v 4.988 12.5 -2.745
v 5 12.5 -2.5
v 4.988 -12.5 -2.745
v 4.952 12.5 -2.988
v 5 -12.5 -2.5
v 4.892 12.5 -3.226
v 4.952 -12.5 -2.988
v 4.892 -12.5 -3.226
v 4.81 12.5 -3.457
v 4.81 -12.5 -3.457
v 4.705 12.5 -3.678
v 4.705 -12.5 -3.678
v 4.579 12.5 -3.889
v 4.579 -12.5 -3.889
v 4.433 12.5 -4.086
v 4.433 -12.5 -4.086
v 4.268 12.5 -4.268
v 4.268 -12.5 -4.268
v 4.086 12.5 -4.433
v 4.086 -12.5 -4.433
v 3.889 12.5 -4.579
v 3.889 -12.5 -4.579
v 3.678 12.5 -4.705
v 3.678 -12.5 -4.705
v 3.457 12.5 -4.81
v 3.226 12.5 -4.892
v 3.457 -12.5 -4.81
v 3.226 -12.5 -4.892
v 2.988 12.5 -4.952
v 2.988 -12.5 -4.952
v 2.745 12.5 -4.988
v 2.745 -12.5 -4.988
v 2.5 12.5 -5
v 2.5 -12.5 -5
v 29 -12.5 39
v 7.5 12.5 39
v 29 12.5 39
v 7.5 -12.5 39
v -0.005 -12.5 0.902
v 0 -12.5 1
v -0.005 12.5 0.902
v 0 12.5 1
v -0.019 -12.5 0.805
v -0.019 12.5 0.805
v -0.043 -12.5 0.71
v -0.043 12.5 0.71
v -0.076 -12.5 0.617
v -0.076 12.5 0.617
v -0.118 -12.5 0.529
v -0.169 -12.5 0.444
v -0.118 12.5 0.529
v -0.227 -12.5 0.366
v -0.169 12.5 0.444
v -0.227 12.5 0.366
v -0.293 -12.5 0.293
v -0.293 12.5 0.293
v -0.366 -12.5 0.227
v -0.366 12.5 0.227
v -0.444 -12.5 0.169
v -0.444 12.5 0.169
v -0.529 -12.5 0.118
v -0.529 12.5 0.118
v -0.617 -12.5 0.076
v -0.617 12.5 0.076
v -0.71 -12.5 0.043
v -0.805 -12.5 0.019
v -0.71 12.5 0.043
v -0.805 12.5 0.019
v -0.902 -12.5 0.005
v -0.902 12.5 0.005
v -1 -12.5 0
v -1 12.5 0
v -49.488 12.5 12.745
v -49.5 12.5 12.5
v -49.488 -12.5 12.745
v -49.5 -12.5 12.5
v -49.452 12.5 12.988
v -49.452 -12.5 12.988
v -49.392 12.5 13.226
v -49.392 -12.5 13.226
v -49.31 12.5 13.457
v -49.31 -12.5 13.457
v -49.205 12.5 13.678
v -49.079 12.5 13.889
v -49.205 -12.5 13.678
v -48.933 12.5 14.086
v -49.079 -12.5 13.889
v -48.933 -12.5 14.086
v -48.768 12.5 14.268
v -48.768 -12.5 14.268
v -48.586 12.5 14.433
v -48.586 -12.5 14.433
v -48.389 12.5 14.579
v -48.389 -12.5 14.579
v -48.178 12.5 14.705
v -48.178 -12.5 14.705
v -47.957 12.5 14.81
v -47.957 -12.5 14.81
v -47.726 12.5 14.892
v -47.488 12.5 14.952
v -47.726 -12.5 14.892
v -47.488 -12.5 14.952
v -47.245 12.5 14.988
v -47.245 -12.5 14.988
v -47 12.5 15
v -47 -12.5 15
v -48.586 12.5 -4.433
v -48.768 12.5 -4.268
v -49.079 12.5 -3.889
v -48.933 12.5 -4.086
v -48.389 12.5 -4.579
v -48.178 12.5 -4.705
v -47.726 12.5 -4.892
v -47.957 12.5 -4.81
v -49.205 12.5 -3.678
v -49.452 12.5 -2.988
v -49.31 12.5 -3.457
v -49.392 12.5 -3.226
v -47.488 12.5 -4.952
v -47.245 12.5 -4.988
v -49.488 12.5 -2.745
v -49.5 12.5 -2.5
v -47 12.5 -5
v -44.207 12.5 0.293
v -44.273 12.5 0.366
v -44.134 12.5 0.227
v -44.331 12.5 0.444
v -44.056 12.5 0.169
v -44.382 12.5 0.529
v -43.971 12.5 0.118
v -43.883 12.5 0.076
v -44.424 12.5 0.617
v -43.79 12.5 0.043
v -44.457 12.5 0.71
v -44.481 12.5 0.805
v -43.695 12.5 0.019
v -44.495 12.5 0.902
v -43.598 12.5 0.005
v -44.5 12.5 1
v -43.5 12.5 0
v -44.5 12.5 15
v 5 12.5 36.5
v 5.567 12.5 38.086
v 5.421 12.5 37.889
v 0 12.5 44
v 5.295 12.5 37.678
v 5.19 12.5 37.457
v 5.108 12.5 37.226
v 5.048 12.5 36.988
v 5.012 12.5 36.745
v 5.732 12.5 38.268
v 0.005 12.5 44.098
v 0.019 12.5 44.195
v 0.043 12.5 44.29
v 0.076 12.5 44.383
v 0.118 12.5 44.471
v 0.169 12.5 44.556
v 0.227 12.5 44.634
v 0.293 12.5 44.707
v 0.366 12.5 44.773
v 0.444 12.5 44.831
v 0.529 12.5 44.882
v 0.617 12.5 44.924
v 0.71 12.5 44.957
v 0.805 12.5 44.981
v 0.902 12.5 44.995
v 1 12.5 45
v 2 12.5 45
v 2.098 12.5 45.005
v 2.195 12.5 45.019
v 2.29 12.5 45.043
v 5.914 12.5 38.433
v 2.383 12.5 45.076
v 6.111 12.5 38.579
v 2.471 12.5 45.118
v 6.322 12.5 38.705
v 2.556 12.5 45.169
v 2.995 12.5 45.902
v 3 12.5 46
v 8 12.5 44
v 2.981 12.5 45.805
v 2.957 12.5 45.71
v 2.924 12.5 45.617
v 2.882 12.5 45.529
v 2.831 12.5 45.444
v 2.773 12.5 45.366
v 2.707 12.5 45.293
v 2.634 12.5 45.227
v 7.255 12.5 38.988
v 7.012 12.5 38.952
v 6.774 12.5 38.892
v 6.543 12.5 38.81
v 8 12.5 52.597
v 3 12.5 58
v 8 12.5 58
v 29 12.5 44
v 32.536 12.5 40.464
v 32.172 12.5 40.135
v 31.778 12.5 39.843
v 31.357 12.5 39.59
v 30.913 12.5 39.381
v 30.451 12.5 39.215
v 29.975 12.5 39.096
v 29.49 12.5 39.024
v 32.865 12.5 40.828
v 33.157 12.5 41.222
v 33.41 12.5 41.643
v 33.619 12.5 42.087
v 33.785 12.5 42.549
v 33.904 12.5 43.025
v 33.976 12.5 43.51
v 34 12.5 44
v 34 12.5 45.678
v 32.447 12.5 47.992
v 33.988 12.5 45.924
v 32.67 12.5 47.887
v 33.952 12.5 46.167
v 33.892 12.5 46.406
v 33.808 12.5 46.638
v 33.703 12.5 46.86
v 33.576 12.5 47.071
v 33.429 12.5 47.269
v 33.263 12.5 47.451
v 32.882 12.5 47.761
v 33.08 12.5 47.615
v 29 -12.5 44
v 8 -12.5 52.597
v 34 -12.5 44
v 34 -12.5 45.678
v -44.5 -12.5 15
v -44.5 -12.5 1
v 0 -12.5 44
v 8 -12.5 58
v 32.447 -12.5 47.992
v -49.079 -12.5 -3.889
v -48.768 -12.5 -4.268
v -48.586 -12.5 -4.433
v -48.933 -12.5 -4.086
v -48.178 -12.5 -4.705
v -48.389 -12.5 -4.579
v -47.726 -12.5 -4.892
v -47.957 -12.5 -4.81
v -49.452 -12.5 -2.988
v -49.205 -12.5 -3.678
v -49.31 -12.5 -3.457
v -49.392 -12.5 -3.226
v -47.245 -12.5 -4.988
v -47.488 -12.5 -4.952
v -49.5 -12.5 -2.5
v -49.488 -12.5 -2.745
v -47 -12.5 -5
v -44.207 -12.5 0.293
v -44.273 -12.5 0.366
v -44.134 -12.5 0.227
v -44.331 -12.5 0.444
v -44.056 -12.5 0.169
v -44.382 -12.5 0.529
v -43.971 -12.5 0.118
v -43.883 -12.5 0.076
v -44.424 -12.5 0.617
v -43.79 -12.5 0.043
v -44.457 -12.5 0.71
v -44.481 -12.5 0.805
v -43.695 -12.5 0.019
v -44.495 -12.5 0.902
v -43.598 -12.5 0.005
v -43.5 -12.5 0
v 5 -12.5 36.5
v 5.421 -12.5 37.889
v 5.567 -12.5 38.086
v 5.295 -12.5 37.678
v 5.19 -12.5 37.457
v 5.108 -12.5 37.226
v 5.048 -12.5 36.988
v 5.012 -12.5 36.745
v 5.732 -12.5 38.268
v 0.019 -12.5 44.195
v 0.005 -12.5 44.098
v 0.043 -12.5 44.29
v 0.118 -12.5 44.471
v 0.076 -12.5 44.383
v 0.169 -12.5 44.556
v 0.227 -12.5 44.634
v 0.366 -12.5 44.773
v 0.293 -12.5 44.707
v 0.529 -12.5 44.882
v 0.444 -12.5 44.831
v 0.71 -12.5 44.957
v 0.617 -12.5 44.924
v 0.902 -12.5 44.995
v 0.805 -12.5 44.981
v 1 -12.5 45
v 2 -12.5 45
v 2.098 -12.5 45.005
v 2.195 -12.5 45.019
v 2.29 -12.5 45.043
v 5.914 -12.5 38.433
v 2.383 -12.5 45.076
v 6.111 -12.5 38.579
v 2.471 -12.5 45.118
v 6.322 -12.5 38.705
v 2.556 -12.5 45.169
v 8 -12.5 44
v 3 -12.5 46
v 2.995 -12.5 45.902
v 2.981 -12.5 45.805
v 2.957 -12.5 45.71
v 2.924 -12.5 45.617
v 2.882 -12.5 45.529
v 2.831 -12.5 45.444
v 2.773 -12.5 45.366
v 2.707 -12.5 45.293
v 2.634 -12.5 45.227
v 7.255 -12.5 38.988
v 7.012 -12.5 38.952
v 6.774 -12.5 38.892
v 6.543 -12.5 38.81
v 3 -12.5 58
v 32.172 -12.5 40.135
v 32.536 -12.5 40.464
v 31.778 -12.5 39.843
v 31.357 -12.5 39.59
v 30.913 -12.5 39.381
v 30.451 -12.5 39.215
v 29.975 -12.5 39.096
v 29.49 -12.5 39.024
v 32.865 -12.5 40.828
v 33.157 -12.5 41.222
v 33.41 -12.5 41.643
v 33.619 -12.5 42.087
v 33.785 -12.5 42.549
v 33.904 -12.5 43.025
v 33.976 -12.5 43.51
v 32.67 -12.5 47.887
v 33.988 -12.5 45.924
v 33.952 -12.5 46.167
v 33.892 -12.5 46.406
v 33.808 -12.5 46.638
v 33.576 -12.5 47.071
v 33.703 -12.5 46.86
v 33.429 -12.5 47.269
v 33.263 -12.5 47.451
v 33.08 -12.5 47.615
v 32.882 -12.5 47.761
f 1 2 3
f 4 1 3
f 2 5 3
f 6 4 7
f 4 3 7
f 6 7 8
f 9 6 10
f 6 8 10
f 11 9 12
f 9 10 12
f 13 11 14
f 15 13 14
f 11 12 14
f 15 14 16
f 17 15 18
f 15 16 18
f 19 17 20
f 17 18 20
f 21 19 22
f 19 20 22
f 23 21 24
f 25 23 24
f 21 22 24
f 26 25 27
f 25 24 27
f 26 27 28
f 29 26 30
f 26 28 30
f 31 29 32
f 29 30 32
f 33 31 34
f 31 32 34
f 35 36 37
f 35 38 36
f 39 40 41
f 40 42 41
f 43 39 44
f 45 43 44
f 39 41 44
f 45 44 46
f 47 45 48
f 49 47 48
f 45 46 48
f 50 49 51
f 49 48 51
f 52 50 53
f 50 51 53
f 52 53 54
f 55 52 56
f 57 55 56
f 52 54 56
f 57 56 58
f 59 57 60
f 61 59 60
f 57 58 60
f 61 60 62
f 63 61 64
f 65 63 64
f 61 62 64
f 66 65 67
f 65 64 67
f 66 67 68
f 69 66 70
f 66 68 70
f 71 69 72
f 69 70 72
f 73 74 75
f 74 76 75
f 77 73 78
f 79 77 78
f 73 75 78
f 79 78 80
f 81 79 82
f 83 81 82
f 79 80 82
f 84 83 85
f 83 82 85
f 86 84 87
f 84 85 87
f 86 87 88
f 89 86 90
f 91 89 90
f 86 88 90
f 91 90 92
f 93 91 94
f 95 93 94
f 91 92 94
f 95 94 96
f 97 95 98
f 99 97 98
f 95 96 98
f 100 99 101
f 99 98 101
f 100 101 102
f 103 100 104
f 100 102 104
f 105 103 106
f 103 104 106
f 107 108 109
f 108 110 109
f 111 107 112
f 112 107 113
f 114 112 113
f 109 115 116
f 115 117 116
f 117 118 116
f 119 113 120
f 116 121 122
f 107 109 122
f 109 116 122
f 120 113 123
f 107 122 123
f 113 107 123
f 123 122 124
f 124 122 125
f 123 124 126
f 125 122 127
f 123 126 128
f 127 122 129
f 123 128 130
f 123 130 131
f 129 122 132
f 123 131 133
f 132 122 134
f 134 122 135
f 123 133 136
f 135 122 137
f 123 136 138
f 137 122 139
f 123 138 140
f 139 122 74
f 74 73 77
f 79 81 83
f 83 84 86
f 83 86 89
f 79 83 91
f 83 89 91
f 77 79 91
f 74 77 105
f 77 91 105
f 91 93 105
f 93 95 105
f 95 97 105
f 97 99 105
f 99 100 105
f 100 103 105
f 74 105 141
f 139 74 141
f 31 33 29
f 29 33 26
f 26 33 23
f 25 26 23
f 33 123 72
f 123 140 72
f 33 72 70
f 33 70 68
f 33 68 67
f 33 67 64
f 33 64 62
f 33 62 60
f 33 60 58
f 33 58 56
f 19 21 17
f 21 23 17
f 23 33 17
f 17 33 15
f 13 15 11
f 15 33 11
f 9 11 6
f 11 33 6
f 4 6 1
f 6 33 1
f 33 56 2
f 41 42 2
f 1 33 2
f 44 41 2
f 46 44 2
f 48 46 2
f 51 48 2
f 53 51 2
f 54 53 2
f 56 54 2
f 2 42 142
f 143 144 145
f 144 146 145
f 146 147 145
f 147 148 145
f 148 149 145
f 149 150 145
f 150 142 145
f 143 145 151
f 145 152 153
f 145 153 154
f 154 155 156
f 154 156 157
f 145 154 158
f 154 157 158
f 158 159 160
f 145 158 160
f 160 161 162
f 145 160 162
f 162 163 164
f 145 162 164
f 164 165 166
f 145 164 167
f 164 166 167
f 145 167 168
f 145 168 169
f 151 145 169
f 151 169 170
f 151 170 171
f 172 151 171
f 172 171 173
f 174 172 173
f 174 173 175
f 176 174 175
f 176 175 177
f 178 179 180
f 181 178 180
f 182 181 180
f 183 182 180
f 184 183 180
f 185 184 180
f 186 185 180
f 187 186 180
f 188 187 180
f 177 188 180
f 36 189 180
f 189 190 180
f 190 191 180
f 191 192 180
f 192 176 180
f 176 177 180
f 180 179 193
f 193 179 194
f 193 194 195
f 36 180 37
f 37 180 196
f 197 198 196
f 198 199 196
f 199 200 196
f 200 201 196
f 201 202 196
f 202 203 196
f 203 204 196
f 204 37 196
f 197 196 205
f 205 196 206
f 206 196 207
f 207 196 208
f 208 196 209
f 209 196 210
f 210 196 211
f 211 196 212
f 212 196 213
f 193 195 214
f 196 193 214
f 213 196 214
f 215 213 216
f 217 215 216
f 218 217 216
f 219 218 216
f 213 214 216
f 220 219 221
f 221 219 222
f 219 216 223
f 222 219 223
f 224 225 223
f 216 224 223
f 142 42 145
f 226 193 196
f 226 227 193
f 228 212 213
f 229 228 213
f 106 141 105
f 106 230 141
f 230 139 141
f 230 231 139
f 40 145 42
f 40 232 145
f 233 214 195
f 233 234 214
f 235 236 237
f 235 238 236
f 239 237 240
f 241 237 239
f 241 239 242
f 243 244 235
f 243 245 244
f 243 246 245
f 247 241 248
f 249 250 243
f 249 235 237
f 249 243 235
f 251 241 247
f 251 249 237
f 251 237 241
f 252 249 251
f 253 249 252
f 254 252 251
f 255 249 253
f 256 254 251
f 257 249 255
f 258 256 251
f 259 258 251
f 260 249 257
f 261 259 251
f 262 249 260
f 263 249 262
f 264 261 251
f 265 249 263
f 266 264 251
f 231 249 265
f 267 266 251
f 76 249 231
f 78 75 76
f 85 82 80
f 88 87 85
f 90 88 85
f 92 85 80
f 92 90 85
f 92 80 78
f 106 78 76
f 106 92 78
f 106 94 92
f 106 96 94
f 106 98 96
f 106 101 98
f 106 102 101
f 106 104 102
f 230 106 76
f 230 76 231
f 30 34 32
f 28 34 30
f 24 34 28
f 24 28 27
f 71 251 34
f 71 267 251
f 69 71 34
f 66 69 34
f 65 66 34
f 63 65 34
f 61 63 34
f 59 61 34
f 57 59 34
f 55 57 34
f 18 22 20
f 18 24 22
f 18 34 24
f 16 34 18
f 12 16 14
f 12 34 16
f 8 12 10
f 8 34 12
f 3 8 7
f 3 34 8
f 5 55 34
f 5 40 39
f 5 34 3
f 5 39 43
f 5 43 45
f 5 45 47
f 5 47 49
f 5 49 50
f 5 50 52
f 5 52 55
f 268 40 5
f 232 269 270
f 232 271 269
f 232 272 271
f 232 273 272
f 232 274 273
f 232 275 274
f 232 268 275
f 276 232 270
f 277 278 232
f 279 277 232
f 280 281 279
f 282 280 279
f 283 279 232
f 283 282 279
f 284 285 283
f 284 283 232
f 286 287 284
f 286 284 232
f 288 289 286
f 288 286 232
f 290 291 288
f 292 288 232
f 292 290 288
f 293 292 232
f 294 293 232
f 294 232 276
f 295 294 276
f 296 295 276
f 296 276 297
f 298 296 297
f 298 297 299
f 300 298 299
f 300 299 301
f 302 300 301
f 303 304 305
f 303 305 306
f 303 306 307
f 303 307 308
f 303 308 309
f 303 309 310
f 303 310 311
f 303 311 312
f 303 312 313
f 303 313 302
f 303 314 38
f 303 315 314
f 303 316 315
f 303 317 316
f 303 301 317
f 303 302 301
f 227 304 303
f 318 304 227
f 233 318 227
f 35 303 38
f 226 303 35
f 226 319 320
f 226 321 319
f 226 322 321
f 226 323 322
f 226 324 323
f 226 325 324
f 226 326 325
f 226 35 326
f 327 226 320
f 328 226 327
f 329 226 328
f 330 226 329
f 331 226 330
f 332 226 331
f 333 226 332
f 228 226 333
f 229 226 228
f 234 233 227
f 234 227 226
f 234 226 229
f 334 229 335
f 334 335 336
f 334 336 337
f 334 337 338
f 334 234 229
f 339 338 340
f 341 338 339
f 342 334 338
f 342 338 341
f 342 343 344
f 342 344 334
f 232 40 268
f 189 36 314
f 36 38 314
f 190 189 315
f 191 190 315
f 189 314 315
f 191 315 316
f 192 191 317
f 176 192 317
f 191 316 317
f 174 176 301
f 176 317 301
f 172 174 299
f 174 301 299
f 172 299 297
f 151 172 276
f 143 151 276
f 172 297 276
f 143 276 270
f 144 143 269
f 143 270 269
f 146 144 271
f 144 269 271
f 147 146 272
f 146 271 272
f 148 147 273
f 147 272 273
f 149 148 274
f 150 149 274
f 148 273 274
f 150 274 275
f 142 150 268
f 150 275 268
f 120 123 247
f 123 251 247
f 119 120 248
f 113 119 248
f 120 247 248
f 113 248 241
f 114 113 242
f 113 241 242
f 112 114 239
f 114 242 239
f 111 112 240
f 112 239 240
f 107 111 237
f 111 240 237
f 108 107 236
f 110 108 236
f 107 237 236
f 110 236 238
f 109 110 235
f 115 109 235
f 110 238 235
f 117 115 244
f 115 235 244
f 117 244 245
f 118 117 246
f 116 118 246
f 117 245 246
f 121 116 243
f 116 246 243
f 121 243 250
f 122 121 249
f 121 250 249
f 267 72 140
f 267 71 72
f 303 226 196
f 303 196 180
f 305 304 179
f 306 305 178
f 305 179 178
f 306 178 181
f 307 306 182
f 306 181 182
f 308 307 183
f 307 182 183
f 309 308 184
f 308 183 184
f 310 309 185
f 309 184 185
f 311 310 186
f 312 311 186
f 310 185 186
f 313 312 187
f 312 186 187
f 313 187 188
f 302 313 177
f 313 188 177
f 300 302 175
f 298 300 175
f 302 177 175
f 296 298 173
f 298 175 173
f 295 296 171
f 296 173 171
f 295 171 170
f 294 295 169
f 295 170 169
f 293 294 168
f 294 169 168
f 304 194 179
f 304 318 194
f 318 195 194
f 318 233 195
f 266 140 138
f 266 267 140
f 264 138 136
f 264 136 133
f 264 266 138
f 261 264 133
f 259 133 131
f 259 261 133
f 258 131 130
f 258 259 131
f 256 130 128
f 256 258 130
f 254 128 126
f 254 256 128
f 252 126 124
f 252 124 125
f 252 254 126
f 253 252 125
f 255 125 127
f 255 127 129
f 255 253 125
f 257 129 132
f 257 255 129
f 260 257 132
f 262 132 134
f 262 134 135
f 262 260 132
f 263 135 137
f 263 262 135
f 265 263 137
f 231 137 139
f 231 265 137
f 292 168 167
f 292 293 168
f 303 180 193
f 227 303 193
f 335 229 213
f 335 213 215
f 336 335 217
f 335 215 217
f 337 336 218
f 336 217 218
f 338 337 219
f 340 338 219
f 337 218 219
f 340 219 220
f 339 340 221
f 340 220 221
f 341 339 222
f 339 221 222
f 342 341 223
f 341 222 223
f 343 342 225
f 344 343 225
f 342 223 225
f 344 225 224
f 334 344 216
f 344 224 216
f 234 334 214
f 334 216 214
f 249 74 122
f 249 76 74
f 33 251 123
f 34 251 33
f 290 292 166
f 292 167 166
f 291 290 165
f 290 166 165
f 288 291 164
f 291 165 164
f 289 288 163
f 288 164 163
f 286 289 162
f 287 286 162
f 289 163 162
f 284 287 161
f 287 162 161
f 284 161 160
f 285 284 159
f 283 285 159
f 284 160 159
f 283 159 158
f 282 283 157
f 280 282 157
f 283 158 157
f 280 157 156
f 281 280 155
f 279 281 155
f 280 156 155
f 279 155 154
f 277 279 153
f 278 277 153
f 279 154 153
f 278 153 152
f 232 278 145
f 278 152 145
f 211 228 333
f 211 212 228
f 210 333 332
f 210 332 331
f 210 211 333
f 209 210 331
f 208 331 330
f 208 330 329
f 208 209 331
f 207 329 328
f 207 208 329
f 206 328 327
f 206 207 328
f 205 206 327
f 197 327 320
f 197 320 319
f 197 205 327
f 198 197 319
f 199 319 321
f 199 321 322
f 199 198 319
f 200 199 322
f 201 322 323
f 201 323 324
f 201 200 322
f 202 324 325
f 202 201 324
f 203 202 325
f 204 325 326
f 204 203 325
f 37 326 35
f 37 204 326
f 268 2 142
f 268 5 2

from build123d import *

# Parameters (mm, degrees)
F1_DEPTH = 12.5
F2_R     = 5
F3_R     = 2.5
F4_R     = 1


with BuildPart() as f1:
    # F0 (on Front) → F1 (new body, symmetric)
    with BuildSketch(Plane.XZ):
        Polygon((0, 0), (-44.5, 0), (-44.5, 15), (-49.5, 15), (-49.5, -5), (-44.5, -5), (0, -5), (5, -5), (5, 39), (34, 39), (34, 47.355823), (8, 58), (3, 58), (3, 45), (0, 45), align=None)
        Polygon((29, 44), (8, 44), (8, 52.59722), align=None, mode=Mode.SUBTRACT)
    extrude(amount=F1_DEPTH, both=True)

    # F2
    f2_edges = [f1.edges().sort_by_distance(p)[0] for p in [
        (34, 0, 39),
    ]]
    fillet(f2_edges, radius=F2_R)

    # F3
    f3_edges = [f1.edges().sort_by_distance(p)[0] for p in [
        (5, 0, -5),
        (-49.5, 0, -5),
        (-49.5, 0, 15),
        (34, 0, 47.355823),
        (5, 0, 39),
    ]]
    fillet(f3_edges, radius=F3_R)

    # F4
    f4_edges = [f1.edges().sort_by_distance(p)[0] for p in [
        (3, 0, 45),
        (0, 0, 45),
        (0, 0, 0),
        (-44.5, 0, 0),
    ]]
    fillet(f4_edges, radius=F4_R)


solid = f1.part
